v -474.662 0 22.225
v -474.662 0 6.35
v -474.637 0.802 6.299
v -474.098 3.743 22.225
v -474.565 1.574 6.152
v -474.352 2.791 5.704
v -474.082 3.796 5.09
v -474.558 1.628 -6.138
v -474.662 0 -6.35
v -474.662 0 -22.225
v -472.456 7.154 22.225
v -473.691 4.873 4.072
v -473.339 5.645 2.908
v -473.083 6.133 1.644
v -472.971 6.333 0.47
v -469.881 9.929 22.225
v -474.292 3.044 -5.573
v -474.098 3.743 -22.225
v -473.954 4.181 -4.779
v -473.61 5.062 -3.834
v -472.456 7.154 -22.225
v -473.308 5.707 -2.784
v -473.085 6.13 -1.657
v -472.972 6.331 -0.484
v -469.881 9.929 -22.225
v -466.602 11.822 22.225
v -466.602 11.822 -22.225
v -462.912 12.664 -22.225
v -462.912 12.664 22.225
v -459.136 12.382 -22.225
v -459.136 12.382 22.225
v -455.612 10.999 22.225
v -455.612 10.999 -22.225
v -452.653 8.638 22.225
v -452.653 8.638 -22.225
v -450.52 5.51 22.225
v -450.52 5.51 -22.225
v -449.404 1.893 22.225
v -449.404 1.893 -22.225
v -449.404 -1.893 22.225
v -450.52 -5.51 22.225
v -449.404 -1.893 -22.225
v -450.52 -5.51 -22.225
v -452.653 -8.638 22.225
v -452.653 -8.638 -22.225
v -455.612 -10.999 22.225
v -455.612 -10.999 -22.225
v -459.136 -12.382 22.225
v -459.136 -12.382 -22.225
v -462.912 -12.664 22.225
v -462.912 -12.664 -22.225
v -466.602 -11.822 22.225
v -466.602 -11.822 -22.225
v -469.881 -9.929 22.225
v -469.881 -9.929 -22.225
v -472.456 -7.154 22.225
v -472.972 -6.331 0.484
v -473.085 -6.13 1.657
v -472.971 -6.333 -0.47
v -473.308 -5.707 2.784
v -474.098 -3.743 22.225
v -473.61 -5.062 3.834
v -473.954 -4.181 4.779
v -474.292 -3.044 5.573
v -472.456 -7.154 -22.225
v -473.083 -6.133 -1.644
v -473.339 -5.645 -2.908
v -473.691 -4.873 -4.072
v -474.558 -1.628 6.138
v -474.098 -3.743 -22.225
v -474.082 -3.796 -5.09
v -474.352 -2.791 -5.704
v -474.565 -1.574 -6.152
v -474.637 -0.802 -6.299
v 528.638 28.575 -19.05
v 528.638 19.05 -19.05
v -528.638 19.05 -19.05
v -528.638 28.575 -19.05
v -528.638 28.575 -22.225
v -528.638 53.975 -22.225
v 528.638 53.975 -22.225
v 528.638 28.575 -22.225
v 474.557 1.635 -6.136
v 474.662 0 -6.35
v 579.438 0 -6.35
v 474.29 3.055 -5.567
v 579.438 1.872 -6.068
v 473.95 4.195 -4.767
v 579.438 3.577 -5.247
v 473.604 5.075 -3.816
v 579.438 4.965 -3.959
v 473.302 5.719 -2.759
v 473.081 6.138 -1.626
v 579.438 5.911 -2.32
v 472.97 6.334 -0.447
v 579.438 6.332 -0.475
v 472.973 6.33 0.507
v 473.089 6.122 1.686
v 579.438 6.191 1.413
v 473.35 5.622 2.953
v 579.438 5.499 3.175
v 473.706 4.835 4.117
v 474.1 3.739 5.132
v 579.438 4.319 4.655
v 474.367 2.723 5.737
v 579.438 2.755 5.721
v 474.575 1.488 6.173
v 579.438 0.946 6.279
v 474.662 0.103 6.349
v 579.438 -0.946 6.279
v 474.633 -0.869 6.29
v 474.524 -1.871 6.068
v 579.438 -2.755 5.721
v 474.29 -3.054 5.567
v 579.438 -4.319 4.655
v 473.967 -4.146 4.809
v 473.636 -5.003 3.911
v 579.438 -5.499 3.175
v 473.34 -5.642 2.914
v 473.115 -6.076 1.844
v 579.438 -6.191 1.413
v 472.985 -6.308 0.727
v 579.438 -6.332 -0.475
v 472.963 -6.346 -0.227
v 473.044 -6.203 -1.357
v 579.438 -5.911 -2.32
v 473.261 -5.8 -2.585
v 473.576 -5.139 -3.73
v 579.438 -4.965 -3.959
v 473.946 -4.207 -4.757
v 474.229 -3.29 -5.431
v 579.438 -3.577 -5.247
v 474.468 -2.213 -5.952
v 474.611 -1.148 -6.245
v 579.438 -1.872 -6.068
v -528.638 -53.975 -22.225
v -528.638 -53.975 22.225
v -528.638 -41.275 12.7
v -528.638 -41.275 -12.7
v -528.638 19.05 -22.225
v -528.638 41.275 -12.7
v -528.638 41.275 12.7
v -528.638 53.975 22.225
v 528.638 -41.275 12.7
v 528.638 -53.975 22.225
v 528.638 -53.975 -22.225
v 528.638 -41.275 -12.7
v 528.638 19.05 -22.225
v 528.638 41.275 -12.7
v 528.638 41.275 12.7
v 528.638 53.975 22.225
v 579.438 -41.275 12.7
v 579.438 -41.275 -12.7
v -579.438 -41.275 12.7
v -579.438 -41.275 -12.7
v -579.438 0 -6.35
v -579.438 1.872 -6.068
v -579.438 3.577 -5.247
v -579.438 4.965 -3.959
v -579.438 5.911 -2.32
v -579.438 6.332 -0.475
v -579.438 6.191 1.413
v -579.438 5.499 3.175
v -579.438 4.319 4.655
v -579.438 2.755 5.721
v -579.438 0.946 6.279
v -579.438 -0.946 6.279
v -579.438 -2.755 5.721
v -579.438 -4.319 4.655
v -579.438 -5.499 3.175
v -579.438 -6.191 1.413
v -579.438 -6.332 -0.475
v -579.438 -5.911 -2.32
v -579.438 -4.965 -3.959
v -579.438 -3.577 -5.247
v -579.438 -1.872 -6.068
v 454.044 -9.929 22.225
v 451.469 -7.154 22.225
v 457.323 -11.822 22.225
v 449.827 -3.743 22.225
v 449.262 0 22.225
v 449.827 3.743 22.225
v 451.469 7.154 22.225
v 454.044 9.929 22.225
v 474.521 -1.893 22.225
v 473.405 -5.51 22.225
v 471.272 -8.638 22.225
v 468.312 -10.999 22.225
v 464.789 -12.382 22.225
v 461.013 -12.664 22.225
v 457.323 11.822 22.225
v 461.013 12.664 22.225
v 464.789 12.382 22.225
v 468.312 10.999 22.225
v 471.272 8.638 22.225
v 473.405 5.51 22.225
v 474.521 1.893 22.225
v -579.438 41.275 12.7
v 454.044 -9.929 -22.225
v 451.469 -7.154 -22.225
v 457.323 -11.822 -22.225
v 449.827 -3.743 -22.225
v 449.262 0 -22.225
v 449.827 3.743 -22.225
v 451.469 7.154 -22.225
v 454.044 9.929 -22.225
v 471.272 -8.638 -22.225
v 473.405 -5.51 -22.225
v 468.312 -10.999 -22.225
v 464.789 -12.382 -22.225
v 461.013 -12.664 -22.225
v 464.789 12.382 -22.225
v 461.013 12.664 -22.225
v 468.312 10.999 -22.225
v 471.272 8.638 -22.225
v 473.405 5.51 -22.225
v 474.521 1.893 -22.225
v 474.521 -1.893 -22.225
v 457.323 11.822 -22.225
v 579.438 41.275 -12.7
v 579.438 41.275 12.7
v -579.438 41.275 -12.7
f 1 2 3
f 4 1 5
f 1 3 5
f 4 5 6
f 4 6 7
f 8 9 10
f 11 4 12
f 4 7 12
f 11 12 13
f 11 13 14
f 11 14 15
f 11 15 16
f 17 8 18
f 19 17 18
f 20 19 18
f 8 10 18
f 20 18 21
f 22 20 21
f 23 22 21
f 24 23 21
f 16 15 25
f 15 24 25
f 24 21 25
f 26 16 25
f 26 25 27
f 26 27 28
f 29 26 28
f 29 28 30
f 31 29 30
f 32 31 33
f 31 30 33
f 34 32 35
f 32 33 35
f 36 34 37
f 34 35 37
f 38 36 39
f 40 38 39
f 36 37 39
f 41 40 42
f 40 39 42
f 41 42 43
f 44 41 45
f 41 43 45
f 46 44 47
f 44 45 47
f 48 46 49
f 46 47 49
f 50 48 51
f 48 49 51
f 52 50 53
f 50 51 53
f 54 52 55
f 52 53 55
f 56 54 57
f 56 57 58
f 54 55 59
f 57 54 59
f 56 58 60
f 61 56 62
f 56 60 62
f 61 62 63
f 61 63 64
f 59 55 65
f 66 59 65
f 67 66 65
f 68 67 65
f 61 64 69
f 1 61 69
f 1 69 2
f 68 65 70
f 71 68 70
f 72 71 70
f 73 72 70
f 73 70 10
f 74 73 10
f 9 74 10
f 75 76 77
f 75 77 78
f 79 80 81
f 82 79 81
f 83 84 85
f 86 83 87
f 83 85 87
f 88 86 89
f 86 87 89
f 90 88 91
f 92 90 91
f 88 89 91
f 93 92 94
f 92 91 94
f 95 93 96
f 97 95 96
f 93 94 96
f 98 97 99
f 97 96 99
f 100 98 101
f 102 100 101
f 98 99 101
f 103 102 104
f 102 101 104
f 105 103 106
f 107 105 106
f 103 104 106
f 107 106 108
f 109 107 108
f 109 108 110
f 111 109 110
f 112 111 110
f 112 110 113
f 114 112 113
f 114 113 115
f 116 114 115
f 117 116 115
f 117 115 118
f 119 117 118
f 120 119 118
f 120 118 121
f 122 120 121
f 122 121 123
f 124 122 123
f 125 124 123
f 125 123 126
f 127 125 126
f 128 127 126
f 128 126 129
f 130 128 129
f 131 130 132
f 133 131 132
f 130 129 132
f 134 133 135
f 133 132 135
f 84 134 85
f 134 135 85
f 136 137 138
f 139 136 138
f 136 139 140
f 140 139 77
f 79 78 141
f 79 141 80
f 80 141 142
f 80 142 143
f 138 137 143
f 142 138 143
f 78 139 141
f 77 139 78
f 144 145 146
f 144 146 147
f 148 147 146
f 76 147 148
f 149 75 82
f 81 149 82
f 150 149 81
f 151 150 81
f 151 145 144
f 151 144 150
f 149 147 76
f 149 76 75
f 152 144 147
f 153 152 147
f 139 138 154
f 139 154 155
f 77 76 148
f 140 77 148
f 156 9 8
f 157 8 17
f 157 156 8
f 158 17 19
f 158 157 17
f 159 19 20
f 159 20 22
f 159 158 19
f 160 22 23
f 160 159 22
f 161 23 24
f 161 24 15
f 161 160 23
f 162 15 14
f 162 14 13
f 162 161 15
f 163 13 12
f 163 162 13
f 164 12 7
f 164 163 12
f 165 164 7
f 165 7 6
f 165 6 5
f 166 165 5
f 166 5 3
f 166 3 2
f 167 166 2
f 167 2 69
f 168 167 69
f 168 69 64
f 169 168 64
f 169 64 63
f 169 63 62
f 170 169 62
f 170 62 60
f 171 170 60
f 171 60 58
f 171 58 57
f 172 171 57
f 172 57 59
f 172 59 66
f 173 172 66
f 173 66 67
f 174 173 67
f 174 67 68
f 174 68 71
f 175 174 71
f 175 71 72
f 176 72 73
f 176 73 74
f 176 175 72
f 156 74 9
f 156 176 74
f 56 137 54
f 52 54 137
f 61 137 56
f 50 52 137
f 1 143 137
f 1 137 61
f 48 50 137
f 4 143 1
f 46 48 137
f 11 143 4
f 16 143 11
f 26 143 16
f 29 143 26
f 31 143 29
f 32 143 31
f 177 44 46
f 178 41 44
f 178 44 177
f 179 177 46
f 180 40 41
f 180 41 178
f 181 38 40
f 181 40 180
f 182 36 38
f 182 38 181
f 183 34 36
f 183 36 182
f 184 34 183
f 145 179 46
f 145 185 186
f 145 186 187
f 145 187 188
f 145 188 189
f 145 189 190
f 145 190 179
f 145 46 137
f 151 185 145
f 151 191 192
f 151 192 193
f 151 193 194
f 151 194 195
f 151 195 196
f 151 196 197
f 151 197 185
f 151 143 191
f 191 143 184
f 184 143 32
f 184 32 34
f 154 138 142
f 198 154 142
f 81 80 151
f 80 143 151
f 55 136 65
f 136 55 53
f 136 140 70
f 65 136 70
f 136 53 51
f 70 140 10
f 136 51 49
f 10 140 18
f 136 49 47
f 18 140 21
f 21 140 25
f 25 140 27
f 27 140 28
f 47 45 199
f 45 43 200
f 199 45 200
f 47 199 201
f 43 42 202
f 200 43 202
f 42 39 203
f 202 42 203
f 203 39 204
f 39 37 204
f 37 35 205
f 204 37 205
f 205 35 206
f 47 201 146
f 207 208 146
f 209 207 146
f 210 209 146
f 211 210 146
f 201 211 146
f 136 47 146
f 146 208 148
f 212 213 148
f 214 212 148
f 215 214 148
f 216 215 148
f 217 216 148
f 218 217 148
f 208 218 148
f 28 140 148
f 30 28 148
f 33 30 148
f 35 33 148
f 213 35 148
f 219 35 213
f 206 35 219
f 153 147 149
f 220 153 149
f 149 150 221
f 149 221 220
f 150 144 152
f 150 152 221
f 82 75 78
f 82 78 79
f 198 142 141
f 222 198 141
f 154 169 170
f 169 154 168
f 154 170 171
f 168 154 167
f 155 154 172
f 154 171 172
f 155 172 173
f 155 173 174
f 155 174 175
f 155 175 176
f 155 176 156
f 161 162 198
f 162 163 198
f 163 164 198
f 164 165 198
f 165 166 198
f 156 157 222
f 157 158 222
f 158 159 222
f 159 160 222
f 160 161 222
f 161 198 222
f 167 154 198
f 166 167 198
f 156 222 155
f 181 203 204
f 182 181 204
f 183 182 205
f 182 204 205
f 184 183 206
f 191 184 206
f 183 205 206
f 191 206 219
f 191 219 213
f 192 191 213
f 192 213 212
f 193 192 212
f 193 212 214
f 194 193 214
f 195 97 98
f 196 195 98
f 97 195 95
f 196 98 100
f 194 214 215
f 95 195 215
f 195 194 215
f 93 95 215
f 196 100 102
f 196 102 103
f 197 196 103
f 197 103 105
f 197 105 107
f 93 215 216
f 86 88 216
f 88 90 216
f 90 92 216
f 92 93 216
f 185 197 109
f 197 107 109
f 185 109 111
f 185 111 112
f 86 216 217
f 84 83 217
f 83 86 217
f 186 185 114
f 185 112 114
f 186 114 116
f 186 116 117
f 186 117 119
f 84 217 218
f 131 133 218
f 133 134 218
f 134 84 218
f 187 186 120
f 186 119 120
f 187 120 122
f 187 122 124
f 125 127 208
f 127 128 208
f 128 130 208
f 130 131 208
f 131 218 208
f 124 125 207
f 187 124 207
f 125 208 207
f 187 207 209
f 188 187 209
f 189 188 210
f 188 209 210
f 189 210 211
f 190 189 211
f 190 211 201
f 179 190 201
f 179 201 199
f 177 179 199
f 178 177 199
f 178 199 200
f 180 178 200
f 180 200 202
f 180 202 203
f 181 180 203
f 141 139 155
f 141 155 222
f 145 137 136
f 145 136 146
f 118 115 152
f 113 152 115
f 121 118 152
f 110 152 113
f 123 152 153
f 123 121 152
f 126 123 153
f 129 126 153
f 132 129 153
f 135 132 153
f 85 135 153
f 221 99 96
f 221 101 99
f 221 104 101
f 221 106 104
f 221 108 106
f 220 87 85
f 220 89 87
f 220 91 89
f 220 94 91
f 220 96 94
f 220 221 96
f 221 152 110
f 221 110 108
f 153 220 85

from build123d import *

# Parameters (mm, degrees)
SKETCH2_W           = 1057.275
SKETCH2_H           = 107.95
BOSS_EXTRUDE1_DEPTH = 22.225
SKETCH3_W           = 25.4
SKETCH3_H           = 82.55
BOSS_EXTRUDE2_DEPTH = 50.8
SKETCH4_R           = 6.35
CUT_EXTRUDE1_DEPTH  = 117.475
SKETCH5_W           = 3.175
SKETCH5_H           = 9.525
CUT_EXTRUDE2_DEPTH  = 1110.611399038
SKETCH6_R           = 12.7
CUT_EXTRUDE3_DEPTH  = 584.64108794


with BuildPart() as part:
    # Sketch2 → Boss-Extrude1 (new, symmetric)
    with BuildSketch(Plane.XY):
        Rectangle(SKETCH2_W, SKETCH2_H)
    extrude(amount=BOSS_EXTRUDE1_DEPTH, both=True)

    # Sketch3 → Boss-Extrude2 (add)
    with BuildSketch(Plane(origin=(528.6375, 0, 0), x_dir=(0, 0, -1), z_dir=(1, 0, 0))):
        Rectangle(SKETCH3_W, SKETCH3_H)
    boss_extrude2 = extrude(amount=BOSS_EXTRUDE2_DEPTH)

    # Sketch4 → Cut-Extrude1 (cut)
    with BuildSketch(Plane(origin=(579.4375, 0, 0), x_dir=(0, 0, -1), z_dir=(1, 0, 0))):
        Circle(SKETCH4_R)
    cut_extrude1 = extrude(amount=-CUT_EXTRUDE1_DEPTH, mode=Mode.SUBTRACT)

    # Mirror1: Boss-Extrude2, Cut-Extrude1 across plane
    add(boss_extrude2.mirror(Plane(origin=(0, 0, 0), x_dir=(0, 0, 1), z_dir=(1, 0, 0))))
    add(cut_extrude1.mirror(Plane(origin=(0, 0, 0), x_dir=(0, 0, 1), z_dir=(1, 0, 0))), mode=Mode.SUBTRACT)

    # Sketch5 → Cut-Extrude2 (cut, through all)
    with BuildSketch(Plane(origin=(528.6375, 0, 0), x_dir=(0, 0, -1), z_dir=(1, 0, 0))):
        with Locations((20.6375, 23.8125)):
            Rectangle(SKETCH5_W, SKETCH5_H)
    extrude(amount=-CUT_EXTRUDE2_DEPTH, mode=Mode.SUBTRACT)

    # Sketch6 → Cut-Extrude3 (cut, through all)
    with BuildSketch(Plane(origin=(0, 0, -22.225), x_dir=(-1, 0, 0), z_dir=(0, 0, -1))):
        with Locations((461.9625, 0)):
            Circle(SKETCH6_R)
        with Locations((-461.9625, 0)):
            Circle(SKETCH6_R)
    extrude(amount=-CUT_EXTRUDE3_DEPTH, mode=Mode.SUBTRACT)


solid = part.part
